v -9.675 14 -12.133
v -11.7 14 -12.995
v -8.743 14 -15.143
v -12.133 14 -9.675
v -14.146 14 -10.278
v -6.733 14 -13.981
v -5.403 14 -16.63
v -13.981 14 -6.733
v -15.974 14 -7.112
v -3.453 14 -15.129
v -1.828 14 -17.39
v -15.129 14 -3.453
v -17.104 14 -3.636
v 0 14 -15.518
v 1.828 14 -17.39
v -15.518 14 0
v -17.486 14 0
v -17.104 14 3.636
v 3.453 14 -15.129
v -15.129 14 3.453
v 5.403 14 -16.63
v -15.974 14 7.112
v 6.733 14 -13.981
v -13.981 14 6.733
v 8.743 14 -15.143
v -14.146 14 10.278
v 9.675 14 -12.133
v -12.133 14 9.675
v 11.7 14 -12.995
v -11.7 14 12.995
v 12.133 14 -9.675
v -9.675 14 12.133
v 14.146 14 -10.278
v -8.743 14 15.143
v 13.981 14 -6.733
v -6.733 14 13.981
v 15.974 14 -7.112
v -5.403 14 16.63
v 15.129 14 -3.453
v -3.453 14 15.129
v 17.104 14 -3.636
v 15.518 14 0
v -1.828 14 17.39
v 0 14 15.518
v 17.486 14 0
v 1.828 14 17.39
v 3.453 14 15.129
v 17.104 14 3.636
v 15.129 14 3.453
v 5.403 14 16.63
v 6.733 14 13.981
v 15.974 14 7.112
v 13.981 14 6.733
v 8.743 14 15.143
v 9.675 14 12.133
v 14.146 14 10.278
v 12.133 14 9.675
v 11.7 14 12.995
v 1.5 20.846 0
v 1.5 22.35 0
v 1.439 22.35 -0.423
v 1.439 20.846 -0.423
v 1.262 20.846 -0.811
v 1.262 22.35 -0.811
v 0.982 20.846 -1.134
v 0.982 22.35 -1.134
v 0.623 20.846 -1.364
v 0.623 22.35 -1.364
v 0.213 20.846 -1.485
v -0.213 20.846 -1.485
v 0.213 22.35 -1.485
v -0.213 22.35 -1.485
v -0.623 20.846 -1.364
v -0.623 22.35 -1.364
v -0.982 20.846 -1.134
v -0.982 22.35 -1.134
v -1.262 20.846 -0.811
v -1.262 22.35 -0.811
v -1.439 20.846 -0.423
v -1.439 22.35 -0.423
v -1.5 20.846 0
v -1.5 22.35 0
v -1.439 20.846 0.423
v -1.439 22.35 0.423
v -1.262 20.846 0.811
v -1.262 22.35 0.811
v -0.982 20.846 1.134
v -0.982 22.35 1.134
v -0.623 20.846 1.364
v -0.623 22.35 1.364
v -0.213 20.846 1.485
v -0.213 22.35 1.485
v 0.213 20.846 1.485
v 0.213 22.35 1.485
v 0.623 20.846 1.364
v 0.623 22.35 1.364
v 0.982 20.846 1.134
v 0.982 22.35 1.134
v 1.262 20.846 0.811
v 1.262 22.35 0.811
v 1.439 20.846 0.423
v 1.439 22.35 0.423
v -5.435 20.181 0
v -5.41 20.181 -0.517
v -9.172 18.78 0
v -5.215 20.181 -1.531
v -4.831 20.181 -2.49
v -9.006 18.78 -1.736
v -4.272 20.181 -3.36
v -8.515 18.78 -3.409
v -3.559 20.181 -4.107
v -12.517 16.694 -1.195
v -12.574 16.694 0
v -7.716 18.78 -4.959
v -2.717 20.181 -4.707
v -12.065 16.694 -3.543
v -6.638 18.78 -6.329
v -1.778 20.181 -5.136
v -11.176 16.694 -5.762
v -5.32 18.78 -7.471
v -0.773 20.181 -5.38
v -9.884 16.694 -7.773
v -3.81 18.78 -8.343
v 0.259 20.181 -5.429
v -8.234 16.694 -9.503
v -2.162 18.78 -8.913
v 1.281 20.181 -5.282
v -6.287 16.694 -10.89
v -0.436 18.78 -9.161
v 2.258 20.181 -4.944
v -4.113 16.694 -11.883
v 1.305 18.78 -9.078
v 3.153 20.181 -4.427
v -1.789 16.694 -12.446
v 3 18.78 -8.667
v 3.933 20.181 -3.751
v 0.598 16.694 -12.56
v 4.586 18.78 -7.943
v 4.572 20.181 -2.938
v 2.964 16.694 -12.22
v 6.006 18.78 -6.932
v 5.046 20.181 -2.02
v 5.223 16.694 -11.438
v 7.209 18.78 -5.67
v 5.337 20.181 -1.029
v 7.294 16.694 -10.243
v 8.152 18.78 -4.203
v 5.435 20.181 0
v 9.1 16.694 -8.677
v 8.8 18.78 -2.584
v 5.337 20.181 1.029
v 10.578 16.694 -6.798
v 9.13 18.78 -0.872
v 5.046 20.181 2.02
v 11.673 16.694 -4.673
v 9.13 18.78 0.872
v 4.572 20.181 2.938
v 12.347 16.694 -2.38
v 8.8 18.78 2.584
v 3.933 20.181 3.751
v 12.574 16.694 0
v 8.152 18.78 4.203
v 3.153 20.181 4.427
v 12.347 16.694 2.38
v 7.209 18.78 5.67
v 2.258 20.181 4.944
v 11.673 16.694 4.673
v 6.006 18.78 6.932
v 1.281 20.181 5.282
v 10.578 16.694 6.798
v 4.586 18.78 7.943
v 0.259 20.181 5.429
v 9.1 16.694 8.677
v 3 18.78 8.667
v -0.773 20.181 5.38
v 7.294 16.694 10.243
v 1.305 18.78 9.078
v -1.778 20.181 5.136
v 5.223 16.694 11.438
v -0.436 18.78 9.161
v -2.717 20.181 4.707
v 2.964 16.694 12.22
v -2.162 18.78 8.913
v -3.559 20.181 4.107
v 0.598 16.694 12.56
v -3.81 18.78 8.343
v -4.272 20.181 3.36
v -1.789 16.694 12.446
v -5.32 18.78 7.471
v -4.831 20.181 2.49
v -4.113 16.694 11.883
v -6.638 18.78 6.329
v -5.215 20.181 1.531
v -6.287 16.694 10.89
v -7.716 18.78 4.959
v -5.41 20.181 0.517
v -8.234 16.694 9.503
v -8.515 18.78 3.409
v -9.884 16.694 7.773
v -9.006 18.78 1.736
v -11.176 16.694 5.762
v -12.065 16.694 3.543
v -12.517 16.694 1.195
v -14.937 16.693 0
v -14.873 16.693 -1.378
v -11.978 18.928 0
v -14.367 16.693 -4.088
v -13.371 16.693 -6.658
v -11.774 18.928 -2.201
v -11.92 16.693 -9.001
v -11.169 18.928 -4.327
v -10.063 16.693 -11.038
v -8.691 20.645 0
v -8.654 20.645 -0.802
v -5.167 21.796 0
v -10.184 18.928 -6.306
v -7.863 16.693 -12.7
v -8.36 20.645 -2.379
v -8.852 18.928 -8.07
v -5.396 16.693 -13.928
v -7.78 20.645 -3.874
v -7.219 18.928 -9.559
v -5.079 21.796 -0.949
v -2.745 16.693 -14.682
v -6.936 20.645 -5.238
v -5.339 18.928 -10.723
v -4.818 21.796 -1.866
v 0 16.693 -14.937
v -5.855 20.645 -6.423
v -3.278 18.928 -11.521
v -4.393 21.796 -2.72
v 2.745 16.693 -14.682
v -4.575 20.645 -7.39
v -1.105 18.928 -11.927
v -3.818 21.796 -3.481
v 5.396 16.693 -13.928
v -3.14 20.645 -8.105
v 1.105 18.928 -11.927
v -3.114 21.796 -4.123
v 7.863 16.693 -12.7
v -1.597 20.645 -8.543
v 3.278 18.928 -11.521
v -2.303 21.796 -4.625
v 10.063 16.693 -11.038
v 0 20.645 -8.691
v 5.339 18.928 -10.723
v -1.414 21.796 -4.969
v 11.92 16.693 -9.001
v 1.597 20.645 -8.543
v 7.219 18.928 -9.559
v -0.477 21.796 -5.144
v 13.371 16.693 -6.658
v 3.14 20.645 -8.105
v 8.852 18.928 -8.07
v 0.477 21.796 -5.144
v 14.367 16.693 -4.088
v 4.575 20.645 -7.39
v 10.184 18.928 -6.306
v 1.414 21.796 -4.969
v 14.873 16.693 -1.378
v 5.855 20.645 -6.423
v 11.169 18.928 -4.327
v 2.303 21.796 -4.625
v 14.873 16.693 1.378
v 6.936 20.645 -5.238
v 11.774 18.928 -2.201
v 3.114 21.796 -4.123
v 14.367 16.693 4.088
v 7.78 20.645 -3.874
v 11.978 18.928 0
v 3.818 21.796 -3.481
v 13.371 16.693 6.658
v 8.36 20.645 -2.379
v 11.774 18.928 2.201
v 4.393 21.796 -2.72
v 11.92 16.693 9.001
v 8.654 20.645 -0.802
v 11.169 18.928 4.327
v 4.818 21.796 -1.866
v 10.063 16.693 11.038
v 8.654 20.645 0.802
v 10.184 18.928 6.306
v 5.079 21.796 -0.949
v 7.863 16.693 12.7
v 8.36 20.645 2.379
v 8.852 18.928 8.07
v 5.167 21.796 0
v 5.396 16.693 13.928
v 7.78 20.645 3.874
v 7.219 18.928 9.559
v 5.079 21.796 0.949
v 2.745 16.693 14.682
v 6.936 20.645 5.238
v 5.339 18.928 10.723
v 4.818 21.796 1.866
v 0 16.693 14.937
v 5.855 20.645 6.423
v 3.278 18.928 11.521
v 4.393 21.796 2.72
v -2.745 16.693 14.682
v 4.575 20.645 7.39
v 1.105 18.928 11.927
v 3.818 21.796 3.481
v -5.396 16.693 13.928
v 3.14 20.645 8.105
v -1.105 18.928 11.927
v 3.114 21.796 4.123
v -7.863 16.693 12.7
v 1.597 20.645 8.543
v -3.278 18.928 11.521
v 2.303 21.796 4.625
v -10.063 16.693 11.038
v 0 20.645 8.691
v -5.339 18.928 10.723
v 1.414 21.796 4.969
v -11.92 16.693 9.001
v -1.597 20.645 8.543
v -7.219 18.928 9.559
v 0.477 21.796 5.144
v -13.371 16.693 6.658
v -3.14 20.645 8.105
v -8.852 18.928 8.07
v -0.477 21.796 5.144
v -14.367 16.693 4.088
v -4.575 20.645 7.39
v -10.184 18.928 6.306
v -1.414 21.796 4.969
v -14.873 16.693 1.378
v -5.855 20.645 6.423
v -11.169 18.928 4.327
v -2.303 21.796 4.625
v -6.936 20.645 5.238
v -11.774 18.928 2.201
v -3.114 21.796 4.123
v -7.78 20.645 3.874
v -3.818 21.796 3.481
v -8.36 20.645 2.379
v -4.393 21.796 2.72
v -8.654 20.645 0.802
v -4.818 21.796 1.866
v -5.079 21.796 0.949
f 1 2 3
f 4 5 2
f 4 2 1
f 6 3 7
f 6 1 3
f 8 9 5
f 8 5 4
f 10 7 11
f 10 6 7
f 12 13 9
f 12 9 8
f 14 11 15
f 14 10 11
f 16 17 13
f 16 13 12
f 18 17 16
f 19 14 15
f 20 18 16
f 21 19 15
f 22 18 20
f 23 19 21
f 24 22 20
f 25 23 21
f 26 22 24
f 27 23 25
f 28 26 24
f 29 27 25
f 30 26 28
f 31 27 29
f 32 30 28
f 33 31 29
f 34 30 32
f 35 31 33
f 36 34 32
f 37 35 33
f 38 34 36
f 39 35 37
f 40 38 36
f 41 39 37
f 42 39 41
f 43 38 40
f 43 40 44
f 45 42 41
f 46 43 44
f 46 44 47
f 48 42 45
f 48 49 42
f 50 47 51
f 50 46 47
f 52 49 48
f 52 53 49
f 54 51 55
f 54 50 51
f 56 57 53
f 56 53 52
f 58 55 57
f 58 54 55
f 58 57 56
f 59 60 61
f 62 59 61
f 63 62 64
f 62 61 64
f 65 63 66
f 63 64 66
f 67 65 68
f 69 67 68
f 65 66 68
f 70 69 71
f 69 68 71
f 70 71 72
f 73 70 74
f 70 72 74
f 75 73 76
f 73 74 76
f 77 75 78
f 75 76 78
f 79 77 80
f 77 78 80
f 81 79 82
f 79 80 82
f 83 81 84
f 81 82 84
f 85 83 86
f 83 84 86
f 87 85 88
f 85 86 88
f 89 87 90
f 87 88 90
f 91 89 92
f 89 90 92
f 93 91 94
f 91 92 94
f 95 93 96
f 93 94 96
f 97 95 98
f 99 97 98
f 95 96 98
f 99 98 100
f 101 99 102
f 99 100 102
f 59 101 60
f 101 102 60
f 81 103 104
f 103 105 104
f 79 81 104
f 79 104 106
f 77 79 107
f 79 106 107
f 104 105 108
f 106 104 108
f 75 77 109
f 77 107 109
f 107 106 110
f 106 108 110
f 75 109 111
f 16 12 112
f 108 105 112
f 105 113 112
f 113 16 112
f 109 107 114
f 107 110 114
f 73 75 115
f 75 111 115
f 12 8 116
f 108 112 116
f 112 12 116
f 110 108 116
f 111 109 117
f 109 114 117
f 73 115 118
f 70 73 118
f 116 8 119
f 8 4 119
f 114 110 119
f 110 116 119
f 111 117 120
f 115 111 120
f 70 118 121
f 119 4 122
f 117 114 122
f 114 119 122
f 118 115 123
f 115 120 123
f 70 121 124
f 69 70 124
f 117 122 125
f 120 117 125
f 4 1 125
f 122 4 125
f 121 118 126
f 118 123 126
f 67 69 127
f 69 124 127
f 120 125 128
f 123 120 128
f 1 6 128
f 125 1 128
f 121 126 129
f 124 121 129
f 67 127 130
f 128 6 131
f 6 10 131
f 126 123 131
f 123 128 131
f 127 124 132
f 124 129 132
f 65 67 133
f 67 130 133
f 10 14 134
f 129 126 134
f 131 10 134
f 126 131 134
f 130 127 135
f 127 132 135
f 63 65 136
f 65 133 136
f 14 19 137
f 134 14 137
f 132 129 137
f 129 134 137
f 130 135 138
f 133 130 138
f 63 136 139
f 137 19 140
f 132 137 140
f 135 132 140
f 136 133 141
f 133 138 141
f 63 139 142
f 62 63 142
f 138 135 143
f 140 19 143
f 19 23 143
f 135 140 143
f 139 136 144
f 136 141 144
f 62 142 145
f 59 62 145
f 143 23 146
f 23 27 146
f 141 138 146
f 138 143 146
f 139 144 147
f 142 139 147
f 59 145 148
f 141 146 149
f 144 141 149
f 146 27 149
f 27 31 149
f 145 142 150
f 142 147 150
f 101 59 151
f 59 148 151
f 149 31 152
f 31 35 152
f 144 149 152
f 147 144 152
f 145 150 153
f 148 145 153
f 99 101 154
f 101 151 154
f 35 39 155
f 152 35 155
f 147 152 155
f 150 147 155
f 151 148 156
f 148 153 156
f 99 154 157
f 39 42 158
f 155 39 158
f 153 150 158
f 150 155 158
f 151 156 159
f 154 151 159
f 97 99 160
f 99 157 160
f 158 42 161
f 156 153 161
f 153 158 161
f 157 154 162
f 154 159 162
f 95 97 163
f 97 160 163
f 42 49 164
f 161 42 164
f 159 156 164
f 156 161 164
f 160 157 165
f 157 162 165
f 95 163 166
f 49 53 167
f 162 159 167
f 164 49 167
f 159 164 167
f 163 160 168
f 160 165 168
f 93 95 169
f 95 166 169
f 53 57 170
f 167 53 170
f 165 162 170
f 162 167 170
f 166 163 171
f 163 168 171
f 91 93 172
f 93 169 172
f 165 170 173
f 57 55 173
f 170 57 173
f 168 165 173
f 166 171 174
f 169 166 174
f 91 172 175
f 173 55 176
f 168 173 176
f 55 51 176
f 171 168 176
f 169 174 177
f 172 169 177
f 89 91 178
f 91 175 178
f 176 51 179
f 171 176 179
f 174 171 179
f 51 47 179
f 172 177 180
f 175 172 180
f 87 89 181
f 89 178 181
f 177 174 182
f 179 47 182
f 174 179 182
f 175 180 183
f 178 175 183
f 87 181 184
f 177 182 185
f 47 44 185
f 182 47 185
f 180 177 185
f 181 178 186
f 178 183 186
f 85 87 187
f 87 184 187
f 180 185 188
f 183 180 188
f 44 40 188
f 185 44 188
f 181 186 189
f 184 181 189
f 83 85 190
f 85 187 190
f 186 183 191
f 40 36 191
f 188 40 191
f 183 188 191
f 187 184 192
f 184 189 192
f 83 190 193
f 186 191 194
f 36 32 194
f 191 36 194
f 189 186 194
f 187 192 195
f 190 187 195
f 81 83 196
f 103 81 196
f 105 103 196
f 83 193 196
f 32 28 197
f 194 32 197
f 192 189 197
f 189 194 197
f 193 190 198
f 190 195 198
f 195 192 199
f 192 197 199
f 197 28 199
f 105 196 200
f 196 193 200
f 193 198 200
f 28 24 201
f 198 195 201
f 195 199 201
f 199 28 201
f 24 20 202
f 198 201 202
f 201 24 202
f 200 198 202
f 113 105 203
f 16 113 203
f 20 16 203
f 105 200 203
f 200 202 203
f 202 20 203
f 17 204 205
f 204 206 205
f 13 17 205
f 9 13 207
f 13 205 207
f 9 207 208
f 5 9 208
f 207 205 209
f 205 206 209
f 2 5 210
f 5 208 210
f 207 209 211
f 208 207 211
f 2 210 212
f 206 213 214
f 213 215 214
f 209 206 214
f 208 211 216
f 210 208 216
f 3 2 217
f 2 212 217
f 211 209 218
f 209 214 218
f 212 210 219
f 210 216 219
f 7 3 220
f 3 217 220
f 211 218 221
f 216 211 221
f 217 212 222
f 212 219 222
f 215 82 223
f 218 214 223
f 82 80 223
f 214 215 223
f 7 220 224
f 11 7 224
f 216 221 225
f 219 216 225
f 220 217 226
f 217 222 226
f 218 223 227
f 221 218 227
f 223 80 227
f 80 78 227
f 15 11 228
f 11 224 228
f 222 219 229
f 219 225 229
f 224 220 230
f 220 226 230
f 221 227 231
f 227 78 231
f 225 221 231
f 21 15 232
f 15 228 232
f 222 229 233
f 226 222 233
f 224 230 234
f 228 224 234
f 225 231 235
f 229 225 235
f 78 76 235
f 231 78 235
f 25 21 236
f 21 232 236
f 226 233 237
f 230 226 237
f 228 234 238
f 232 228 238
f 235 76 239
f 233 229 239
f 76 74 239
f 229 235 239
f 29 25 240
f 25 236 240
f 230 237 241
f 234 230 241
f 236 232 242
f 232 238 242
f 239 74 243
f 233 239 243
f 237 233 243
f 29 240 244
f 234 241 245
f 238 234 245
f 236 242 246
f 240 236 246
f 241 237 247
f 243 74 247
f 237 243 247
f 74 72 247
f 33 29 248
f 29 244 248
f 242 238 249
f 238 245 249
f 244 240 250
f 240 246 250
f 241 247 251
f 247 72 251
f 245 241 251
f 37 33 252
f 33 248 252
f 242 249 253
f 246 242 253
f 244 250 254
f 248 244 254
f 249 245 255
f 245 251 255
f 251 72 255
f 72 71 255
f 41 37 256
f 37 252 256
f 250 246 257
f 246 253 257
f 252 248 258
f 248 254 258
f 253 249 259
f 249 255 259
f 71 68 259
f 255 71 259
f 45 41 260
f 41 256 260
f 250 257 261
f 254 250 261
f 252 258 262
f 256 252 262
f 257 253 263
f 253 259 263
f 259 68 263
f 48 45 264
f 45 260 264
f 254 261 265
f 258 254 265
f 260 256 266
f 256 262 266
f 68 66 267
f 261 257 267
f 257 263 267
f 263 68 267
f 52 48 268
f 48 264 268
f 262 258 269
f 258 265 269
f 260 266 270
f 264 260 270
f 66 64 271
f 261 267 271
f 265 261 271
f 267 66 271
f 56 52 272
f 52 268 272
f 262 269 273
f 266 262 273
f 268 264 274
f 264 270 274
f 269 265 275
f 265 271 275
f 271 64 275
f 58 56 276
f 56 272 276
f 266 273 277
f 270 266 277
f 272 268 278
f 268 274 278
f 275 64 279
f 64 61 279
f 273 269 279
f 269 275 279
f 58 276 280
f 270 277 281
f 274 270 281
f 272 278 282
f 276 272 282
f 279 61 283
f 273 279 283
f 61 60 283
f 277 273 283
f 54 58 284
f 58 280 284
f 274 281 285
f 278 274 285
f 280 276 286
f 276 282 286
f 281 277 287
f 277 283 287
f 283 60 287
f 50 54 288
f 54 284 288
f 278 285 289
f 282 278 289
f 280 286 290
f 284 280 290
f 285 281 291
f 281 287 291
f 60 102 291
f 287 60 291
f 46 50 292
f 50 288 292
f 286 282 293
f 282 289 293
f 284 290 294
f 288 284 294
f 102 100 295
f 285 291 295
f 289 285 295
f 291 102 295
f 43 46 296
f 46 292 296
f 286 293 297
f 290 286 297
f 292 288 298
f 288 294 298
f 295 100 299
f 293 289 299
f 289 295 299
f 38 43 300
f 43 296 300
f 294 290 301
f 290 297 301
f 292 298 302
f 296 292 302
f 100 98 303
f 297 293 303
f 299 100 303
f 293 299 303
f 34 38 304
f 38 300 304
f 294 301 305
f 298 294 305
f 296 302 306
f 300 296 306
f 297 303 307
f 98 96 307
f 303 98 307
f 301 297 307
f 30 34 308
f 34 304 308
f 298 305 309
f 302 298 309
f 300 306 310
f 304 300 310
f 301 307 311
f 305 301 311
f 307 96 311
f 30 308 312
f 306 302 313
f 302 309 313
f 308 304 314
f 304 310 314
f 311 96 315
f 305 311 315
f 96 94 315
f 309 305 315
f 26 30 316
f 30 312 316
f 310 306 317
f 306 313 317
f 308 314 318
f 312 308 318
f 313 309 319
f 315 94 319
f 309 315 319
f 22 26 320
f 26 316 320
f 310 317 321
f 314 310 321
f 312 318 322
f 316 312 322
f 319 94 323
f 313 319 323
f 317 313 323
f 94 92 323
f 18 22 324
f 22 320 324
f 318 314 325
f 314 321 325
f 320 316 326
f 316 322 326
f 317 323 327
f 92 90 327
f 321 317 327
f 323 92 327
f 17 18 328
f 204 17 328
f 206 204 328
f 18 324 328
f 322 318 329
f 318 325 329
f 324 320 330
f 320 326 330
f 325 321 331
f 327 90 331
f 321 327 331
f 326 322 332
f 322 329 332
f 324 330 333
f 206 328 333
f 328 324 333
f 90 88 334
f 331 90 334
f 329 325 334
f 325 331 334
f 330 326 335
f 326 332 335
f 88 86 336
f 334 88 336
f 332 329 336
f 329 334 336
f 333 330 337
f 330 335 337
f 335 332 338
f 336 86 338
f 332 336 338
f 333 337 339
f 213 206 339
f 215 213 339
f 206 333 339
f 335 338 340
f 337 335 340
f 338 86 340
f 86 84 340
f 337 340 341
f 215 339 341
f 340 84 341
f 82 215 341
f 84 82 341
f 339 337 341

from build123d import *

# Parameters (mm, degrees)
SKETCH3_W          = 65.903471667
SKETCH3_H          = 42.94663955
CUT_EXTRUDE1_DEPTH = 25
SKETCH5_R          = 1.5
CUT_EXTRUDE2_DEPTH = 25


with BuildPart() as part:
    # Sketch1 → Revolve1 (revolve)
    with BuildSketch(Plane.XY):
        with BuildLine():
            Line((0, 22.4), (0, 0))
            Line((0, 0), (0, -22.4))
            ThreePointArc((0, -22.4), (-22.4, 0), (0, 22.4))
        make_face()
    revolve(axis=Axis((0, 51.787709497, 0), (0, -1, 0)))

    # Sketch3 → Cut-Extrude1 (cut, symmetric)
    with BuildSketch(Plane.XY):
        with Locations((-0.554743028, -7.473319775)):
            Rectangle(SKETCH3_W, SKETCH3_H)
    extrude(amount=CUT_EXTRUDE1_DEPTH, both=True, mode=Mode.SUBTRACT)

    # Sketch4 → Cut-Revolve1 (revolve, cut)
    with BuildSketch(Plane.XY):
        with BuildLine():
            Line((0, 0), (0, 20.9))
            ThreePointArc((0, 20.9), (-20.9, 0), (0, -20.9))
            Line((0, -20.9), (0, 0))
        make_face()
    revolve(axis=Axis((0, 39.939026177, 0), (0, -1, 0)), mode=Mode.SUBTRACT)

    # Sketch5 → Cut-Extrude2 (cut, symmetric)
    with BuildSketch(Plane(origin=(0, 0, 0), x_dir=(1, 0, 0), z_dir=(0, 1, 0))):
        Circle(SKETCH5_R)
    extrude(amount=CUT_EXTRUDE2_DEPTH, both=True, mode=Mode.SUBTRACT)


solid = part.part
